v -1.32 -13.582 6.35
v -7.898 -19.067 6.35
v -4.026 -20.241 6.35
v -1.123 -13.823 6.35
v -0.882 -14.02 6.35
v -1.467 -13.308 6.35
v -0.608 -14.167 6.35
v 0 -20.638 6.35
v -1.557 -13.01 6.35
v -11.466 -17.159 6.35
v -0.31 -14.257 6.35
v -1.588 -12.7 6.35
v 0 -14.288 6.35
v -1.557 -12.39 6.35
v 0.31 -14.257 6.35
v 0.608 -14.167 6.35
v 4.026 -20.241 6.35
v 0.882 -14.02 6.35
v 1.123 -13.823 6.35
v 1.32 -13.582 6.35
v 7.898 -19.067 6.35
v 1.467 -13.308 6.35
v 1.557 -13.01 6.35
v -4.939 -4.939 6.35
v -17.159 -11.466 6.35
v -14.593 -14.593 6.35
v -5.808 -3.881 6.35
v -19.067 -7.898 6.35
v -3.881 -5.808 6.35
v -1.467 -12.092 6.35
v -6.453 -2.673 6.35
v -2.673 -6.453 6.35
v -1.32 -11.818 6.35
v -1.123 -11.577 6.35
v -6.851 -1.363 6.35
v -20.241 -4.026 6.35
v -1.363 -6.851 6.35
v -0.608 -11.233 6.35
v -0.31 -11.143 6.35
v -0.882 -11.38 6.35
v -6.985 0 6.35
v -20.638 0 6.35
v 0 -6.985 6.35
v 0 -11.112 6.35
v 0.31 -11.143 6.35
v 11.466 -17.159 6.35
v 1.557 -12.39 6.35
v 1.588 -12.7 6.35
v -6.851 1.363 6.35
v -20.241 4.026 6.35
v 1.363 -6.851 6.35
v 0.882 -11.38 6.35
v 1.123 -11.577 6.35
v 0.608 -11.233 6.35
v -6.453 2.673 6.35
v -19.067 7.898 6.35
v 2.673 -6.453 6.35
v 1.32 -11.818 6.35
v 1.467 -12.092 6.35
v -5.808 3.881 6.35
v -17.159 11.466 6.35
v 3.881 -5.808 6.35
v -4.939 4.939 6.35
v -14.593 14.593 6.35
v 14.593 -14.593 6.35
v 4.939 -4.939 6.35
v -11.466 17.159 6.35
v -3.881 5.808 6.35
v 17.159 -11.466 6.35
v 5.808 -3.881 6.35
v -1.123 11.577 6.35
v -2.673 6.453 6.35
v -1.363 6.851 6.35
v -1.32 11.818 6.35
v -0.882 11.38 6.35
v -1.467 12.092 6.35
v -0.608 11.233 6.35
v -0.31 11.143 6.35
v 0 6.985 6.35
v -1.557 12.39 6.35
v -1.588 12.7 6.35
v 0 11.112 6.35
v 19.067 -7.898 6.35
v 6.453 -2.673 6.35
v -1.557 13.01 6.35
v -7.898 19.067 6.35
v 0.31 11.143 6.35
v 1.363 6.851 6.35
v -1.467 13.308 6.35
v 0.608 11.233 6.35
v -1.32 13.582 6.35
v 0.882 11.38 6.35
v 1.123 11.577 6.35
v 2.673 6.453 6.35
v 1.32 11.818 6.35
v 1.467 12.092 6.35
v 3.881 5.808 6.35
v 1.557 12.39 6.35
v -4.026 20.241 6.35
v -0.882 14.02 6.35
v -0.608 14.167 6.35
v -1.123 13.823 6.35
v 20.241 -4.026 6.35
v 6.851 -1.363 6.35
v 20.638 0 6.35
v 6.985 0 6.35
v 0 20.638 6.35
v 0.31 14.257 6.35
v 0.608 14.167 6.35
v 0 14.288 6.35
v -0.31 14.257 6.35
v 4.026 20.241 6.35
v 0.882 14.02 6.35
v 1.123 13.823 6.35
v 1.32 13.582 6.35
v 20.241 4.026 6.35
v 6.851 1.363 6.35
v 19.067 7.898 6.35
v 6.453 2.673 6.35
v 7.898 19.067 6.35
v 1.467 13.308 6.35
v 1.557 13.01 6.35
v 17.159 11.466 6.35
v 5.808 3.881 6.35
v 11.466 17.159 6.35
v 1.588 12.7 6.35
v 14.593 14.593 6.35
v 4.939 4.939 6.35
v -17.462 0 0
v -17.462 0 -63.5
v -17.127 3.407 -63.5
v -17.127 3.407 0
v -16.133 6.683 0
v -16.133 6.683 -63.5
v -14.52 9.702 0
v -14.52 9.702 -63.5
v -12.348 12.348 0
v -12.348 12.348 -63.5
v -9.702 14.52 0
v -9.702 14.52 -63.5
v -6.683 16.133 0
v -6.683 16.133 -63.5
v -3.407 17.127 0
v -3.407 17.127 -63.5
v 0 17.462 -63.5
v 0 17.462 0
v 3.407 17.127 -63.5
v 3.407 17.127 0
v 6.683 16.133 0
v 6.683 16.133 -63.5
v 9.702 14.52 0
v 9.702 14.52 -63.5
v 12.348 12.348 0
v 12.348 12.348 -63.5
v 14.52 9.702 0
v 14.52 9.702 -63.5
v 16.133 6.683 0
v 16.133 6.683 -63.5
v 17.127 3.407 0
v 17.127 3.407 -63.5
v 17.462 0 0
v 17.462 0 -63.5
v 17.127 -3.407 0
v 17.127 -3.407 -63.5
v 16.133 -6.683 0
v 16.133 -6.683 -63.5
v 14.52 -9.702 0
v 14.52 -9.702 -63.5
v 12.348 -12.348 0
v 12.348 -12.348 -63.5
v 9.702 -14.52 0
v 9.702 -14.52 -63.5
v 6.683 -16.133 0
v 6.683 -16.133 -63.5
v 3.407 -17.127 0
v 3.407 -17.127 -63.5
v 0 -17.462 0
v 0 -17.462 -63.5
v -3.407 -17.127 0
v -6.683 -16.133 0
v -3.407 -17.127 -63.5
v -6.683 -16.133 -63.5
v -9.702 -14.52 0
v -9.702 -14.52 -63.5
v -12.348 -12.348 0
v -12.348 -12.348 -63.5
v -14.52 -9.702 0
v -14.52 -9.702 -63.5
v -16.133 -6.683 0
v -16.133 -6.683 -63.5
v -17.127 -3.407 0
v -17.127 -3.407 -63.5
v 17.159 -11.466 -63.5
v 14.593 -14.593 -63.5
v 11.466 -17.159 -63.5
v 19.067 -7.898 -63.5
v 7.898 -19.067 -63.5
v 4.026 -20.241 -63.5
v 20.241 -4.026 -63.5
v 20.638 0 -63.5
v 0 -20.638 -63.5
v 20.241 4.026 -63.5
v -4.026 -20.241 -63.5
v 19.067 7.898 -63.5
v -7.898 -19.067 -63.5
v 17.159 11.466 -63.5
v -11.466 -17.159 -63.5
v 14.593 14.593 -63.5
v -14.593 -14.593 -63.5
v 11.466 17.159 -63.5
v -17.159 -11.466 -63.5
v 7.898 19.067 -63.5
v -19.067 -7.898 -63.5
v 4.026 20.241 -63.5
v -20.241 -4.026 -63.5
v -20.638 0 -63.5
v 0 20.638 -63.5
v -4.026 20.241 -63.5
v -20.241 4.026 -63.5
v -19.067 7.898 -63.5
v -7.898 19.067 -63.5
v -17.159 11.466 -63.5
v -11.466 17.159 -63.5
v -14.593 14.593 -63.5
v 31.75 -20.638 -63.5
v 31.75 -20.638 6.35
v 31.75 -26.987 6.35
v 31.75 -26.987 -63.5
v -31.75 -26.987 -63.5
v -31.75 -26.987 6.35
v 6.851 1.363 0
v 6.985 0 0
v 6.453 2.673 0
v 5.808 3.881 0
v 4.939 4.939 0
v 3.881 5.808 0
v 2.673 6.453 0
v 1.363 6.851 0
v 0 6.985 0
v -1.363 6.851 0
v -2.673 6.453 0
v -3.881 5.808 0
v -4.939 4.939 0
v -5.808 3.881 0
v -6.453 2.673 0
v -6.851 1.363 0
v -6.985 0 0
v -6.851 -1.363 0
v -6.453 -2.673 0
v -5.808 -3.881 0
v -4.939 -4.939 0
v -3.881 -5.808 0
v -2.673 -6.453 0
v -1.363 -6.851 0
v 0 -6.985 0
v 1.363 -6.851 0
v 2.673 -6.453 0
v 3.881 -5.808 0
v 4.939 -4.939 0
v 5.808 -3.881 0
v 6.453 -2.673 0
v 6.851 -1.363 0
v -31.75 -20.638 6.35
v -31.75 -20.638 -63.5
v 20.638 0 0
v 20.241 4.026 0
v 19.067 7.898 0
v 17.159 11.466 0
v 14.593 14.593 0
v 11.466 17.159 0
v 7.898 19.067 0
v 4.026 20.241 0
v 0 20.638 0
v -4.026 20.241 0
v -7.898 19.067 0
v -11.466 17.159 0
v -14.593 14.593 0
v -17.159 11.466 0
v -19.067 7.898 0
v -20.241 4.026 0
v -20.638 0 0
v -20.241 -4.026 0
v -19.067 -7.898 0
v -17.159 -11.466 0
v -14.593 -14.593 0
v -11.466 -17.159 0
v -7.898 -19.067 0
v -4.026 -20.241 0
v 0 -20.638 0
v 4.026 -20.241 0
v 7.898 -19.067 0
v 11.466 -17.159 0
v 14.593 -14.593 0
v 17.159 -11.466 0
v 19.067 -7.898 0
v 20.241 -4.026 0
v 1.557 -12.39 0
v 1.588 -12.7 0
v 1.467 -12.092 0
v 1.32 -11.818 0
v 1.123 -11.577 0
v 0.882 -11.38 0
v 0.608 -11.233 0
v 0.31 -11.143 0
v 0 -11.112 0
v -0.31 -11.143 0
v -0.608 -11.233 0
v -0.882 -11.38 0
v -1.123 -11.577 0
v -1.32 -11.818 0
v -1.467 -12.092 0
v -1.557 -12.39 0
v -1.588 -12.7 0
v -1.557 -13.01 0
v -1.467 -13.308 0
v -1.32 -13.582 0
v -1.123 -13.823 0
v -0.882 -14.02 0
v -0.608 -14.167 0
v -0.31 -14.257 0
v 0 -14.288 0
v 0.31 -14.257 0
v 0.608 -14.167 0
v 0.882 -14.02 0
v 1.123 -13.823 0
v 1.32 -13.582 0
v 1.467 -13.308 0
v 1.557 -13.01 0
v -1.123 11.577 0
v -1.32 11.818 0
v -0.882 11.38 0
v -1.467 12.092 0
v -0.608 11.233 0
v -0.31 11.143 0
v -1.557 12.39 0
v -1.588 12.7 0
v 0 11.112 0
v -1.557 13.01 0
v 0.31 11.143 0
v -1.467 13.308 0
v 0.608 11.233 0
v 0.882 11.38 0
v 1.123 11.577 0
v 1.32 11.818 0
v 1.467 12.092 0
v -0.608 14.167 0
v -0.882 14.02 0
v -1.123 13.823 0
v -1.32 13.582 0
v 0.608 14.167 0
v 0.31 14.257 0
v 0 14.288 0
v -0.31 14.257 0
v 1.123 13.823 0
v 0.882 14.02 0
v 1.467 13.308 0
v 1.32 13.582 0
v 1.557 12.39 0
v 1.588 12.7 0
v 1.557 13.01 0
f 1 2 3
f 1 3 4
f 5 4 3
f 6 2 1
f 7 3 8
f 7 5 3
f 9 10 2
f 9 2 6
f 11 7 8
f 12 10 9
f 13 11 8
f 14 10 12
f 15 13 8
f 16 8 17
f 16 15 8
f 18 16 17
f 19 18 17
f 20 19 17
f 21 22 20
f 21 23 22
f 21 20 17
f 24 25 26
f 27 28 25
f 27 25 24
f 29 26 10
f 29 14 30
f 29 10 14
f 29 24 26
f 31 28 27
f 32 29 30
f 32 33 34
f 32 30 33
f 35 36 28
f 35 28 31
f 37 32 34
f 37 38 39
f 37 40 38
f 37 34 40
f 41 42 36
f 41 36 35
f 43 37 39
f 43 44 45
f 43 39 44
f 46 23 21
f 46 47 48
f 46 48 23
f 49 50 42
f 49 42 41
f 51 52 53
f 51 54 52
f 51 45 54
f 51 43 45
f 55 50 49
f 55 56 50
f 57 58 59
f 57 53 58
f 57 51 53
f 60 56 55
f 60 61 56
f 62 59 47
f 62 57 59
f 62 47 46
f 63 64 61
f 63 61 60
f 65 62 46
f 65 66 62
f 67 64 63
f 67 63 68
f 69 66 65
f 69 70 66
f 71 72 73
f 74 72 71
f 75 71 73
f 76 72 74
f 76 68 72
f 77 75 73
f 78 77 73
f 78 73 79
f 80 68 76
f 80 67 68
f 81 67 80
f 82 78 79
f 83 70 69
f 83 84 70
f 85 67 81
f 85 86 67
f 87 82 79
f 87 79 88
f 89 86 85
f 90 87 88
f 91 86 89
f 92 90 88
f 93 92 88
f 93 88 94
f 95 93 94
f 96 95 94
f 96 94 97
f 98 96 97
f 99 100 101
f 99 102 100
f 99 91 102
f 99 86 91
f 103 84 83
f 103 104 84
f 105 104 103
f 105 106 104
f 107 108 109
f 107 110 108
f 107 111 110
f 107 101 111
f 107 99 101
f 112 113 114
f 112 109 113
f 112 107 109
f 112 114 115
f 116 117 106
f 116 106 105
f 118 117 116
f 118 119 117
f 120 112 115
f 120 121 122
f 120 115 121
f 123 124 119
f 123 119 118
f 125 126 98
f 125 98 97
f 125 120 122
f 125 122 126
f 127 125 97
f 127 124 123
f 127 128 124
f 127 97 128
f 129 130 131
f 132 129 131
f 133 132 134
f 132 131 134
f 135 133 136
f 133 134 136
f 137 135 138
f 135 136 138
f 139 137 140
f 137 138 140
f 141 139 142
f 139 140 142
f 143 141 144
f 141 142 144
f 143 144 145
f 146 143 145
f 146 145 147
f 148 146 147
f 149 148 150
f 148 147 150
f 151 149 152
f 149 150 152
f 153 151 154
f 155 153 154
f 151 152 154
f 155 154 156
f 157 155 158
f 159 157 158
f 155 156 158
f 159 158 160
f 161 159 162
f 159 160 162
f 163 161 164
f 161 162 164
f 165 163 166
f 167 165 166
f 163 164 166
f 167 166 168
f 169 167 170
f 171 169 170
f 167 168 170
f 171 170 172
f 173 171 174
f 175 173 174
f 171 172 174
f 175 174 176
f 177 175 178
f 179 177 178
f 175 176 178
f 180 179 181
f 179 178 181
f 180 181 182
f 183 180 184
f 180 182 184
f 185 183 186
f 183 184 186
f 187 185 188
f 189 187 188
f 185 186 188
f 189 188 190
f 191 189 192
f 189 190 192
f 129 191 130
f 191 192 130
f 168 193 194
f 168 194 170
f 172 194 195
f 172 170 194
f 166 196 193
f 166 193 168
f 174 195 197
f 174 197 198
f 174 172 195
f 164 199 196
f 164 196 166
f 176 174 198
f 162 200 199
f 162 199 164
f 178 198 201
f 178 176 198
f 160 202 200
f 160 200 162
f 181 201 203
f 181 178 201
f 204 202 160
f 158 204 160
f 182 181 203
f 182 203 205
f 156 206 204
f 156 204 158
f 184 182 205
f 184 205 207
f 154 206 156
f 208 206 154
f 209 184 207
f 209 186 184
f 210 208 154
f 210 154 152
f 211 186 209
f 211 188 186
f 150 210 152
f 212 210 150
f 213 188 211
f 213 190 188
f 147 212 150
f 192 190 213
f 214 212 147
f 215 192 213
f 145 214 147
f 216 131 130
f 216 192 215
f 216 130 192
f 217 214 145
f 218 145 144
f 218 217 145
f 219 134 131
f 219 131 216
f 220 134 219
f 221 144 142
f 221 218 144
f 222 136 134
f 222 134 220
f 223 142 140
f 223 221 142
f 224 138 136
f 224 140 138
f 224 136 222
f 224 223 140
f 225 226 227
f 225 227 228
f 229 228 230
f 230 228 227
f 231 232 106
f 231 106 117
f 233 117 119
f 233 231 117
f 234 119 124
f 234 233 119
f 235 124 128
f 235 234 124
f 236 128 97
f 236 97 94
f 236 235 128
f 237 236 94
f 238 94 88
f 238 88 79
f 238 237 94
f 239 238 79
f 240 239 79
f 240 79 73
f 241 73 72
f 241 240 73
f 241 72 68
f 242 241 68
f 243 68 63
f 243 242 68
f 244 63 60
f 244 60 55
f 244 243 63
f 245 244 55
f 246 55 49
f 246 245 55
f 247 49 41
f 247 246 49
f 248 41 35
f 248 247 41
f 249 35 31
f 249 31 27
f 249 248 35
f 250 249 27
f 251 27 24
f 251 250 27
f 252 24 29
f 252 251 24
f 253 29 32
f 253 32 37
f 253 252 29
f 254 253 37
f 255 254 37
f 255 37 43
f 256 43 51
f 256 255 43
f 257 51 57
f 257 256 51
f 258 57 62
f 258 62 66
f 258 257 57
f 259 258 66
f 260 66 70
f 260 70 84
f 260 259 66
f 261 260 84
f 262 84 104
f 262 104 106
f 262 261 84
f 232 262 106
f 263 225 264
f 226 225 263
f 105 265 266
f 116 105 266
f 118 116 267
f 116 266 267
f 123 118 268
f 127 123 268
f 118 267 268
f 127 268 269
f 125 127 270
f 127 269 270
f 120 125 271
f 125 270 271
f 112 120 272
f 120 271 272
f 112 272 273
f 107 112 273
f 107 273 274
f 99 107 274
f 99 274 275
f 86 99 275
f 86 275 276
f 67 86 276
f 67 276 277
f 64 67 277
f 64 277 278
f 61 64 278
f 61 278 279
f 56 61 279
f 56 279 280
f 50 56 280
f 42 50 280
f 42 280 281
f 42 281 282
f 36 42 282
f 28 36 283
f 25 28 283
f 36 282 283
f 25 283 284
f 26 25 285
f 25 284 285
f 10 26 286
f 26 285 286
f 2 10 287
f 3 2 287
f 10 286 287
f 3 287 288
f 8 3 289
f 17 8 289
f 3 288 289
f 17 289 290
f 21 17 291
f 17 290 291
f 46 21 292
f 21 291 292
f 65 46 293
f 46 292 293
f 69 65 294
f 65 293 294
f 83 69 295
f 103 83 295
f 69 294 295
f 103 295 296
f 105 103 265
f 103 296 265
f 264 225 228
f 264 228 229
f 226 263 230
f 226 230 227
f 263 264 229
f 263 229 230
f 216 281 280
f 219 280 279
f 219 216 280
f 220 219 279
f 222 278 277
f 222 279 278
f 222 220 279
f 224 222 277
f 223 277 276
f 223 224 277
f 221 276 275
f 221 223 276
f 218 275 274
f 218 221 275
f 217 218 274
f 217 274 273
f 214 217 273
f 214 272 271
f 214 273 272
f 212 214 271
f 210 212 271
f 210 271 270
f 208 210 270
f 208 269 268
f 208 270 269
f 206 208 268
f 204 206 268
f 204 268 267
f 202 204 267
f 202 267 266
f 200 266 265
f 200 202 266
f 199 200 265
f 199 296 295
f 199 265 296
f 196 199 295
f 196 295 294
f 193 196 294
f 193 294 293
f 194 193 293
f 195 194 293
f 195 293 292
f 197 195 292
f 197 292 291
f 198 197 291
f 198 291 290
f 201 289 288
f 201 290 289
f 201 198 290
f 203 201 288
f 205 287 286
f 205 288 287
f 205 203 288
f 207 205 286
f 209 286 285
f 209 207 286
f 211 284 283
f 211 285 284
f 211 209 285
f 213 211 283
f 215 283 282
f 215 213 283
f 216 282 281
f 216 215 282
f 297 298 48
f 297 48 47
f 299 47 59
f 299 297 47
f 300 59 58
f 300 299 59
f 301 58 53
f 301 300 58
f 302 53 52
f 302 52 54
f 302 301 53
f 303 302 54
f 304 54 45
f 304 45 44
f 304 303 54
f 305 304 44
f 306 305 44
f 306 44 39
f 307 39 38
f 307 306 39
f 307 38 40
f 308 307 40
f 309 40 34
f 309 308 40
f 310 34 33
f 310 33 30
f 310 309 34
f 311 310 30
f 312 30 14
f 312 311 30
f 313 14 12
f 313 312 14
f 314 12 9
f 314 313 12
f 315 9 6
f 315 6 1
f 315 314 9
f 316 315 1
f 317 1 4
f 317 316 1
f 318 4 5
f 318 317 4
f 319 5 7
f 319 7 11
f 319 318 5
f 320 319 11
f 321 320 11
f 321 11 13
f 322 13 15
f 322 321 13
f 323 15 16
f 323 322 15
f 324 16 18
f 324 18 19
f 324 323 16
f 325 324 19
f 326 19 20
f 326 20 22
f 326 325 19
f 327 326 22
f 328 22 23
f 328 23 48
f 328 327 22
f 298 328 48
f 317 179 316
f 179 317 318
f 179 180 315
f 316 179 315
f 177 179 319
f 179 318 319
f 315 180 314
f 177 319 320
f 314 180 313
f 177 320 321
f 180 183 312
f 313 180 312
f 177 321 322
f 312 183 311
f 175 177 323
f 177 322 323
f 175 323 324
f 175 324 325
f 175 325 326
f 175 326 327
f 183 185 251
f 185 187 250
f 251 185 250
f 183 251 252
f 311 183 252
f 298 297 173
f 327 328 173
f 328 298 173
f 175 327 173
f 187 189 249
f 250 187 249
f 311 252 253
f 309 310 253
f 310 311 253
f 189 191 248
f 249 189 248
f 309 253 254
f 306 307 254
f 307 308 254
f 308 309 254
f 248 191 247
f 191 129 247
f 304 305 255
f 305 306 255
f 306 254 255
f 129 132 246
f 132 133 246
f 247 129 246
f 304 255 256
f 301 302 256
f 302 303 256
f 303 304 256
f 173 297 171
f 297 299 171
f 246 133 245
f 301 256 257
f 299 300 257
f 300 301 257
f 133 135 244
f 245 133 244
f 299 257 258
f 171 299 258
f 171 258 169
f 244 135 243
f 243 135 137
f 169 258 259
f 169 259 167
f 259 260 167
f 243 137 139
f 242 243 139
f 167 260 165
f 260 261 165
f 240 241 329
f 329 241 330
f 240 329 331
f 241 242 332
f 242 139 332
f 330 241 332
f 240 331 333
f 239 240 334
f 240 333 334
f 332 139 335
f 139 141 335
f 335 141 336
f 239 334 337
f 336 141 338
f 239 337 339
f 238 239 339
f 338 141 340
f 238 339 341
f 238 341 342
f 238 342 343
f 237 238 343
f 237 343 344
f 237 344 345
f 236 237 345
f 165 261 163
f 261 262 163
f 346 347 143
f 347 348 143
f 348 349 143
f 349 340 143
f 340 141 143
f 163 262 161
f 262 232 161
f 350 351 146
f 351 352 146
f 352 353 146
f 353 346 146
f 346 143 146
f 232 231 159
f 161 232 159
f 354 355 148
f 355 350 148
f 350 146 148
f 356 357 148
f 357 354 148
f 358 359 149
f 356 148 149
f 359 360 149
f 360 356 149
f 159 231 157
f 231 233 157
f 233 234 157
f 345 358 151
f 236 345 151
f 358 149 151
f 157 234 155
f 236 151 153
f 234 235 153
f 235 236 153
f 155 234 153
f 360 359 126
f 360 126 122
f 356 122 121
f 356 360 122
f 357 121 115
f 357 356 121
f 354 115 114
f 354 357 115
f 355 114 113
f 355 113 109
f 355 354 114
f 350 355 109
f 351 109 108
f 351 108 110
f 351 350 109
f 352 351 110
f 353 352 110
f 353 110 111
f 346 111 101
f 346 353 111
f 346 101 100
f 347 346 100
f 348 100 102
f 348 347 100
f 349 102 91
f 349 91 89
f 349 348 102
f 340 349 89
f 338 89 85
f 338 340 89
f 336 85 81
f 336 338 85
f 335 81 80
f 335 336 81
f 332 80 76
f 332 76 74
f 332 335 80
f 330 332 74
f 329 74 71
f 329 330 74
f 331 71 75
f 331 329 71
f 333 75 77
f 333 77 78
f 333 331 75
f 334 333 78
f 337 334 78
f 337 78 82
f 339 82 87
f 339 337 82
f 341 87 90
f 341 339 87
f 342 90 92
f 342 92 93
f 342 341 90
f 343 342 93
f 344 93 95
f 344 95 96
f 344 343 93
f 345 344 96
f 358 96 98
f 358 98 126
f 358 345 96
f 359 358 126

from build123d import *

# Parameters (mm, degrees)
SKETCH1_R           = 20.6375
SKETCH1_R_2         = 19.05
SKETCH1_R_3         = 1.5875
SKETCH1_R_4         = 6.985
BOSS_EXTRUDE1_DEPTH = 6.35
BOSS_EXTRUDE2_START = 63.5
SKETCH2_R           = 20.6375
SKETCH2_R_2         = 17.4625
BOSS_EXTRUDE2_DEPTH = 63.5
BOSS_EXTRUDE3_DEPTH = 6.35


with BuildPart() as part:
    # Sketch1 → Boss-Extrude1 (new body)
    # profile 1 of 2: a face of its own
    with BuildSketch(Plane.XY):
        Circle(SKETCH1_R)
        Circle(SKETCH1_R_2, mode=Mode.SUBTRACT)
    # profile 2 of 2: a face of its own
    with BuildSketch(Plane.XY):
        Circle(SKETCH1_R_2)
        with Locations((0, -12.7)):
            Circle(SKETCH1_R_3, mode=Mode.SUBTRACT)
        with Locations((0, 12.7)):
            Circle(SKETCH1_R_3, mode=Mode.SUBTRACT)
        Circle(SKETCH1_R_4, mode=Mode.SUBTRACT)
    extrude(amount=BOSS_EXTRUDE1_DEPTH)

    # Sketch2 → Boss-Extrude2 (add)
    with BuildSketch(Plane(origin=(0, 0, 0), x_dir=(-1, 0, 0), z_dir=(0, 0, -1)).offset(BOSS_EXTRUDE2_START)):
        Circle(SKETCH2_R)
        Circle(SKETCH2_R_2, mode=Mode.SUBTRACT)
    extrude(amount=-BOSS_EXTRUDE2_DEPTH)


with BuildPart() as body_2:
    # 3DSketch2 → Boss-Extrude3 (new body)
    with BuildSketch(Plane(origin=(-31.75, -20.6375, 6.35), x_dir=(0.6726727939963125, 0, -0.7399400733959437), z_dir=(0, -1, 0))):
        Polygon((0, 0), (42.714722419, 46.986194661), (94.399536545, 0), (51.684814127, -46.986194661), align=None)
    extrude(amount=BOSS_EXTRUDE3_DEPTH)


solid = Compound([part.part, body_2.part])
